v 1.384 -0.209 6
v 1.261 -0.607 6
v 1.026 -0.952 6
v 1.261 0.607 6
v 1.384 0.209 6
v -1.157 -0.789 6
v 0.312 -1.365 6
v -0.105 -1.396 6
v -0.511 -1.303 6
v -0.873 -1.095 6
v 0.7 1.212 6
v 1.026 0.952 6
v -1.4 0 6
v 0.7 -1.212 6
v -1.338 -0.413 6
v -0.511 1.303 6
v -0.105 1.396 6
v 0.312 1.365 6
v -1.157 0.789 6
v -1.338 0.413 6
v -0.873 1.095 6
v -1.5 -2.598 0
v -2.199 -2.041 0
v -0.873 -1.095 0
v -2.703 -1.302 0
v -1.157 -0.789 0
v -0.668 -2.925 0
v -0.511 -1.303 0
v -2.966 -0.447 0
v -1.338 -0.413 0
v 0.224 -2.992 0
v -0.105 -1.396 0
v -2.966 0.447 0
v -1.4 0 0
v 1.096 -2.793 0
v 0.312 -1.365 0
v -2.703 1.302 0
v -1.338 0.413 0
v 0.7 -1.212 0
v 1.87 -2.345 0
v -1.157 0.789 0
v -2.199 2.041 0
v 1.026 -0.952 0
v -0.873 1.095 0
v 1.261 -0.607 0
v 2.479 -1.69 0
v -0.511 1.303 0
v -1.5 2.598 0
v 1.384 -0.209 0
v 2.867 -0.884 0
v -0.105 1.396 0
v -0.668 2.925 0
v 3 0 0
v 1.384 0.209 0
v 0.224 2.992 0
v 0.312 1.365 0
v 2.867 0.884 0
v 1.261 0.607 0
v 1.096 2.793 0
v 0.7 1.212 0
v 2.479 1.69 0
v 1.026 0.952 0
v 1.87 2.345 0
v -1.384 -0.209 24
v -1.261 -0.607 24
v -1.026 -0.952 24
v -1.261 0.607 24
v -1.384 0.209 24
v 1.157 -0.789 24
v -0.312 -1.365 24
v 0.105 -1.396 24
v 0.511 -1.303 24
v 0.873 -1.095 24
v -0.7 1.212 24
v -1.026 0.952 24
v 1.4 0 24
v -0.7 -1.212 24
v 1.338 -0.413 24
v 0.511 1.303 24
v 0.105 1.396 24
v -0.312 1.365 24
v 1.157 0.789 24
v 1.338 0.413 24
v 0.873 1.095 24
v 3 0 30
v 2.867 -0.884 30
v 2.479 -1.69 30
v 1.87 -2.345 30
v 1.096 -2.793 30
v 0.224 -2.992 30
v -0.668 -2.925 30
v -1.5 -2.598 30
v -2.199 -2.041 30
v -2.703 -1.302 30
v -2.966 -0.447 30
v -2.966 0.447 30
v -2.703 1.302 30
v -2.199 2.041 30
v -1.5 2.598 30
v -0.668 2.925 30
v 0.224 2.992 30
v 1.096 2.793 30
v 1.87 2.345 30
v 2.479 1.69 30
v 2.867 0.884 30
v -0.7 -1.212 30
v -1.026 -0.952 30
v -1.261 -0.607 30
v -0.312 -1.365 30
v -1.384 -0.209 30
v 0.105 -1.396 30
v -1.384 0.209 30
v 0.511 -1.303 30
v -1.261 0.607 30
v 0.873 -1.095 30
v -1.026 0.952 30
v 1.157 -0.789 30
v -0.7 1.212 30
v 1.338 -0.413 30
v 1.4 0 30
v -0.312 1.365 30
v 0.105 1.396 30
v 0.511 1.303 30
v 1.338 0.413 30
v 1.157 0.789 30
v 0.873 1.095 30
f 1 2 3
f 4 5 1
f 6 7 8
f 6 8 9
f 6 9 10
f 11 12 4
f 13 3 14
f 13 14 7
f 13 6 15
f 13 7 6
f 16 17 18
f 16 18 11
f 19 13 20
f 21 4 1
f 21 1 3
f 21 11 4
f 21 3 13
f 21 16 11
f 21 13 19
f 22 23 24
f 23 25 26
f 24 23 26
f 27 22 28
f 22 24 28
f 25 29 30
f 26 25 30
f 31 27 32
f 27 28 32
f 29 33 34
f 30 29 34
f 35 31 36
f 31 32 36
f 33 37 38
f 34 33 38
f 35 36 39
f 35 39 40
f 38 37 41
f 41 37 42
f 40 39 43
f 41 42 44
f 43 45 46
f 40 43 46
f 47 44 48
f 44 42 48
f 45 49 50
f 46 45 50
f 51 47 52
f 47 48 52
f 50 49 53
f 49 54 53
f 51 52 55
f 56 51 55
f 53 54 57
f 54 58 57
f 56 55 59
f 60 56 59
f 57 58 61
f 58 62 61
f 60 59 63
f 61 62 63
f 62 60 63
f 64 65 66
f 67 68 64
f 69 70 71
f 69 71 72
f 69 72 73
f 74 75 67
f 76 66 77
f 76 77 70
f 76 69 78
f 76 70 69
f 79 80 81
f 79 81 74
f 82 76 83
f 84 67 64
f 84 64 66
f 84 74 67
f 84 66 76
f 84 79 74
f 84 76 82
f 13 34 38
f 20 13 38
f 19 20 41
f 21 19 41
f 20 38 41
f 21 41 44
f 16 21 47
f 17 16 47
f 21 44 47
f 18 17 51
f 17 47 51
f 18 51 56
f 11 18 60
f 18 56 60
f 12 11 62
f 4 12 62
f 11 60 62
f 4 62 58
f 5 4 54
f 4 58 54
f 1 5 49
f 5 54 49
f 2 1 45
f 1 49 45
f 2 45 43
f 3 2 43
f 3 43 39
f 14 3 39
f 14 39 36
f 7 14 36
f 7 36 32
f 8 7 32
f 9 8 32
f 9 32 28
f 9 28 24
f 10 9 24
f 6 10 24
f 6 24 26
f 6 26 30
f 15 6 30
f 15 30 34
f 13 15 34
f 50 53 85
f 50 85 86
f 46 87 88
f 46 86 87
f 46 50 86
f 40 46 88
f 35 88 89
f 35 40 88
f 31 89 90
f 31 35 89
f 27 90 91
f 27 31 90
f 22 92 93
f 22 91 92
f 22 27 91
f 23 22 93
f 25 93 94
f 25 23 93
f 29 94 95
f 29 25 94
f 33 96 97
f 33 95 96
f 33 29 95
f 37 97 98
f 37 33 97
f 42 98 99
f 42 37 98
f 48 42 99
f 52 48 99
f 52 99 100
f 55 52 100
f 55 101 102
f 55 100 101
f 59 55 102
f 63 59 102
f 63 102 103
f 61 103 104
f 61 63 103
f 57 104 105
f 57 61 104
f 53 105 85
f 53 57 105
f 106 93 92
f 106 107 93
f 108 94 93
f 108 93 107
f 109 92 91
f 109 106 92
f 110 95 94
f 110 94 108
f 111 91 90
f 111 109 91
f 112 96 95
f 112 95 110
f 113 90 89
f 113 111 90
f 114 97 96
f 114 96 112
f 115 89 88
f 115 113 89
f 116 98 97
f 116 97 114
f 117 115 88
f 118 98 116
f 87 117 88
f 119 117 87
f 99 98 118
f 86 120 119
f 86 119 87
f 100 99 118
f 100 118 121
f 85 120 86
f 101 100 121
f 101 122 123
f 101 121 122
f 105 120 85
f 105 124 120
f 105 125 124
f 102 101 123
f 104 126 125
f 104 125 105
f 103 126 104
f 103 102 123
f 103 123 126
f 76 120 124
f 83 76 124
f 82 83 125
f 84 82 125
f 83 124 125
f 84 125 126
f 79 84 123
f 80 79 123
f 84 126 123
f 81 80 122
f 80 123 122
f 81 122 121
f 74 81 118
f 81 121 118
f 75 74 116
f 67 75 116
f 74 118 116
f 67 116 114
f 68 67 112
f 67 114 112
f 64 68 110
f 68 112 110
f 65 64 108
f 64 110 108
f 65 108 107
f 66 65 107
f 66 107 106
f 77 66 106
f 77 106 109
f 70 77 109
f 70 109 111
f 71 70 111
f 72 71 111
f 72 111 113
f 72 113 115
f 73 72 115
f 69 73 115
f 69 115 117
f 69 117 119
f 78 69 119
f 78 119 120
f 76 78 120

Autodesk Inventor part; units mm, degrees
ref_plane "YZ Plane" through (0, 0, 0) normal (1, 0, 0) x (0, 1, 0)
ref_plane "XZ Plane" through (0, 0, 0) normal (0, 1, 0) x (-1, 0, 0)
ref_plane "XY Plane" through (0, 0, 0) normal (0, 0, 1) x (1, 0, 0)
sketch "スケッチ1" plane through (0, 0, 0) normal (0, 0, 1) x (1, 0, 0)
  circle A0 centre (0, 0) radius 3
  dimension "d0" = 6
extrude "押し出し1" add sketch "スケッチ1" along normal blind 30
sketch "スケッチ2" plane through (0, 0, 30) normal (0, 0, 1) x (1, 0, 0)
  circle A0 centre (0, 0) radius 1.4
  dimension "d3" = 2.8
extrude "押し出し2" cut sketch "スケッチ2" against normal blind 6
sketch "スケッチ3" plane through (0, 0, 0) normal (0, 0, -1) x (-1, 0, 0)
  circle A0 centre (0, 0) radius 1.4 projected
  circle A1 centre (0, 0) radius 1.4
extrude "押し出し3" cut sketch "スケッチ3" against normal blind 6
properties part number "34mm" material "アルミニウム 6061"
